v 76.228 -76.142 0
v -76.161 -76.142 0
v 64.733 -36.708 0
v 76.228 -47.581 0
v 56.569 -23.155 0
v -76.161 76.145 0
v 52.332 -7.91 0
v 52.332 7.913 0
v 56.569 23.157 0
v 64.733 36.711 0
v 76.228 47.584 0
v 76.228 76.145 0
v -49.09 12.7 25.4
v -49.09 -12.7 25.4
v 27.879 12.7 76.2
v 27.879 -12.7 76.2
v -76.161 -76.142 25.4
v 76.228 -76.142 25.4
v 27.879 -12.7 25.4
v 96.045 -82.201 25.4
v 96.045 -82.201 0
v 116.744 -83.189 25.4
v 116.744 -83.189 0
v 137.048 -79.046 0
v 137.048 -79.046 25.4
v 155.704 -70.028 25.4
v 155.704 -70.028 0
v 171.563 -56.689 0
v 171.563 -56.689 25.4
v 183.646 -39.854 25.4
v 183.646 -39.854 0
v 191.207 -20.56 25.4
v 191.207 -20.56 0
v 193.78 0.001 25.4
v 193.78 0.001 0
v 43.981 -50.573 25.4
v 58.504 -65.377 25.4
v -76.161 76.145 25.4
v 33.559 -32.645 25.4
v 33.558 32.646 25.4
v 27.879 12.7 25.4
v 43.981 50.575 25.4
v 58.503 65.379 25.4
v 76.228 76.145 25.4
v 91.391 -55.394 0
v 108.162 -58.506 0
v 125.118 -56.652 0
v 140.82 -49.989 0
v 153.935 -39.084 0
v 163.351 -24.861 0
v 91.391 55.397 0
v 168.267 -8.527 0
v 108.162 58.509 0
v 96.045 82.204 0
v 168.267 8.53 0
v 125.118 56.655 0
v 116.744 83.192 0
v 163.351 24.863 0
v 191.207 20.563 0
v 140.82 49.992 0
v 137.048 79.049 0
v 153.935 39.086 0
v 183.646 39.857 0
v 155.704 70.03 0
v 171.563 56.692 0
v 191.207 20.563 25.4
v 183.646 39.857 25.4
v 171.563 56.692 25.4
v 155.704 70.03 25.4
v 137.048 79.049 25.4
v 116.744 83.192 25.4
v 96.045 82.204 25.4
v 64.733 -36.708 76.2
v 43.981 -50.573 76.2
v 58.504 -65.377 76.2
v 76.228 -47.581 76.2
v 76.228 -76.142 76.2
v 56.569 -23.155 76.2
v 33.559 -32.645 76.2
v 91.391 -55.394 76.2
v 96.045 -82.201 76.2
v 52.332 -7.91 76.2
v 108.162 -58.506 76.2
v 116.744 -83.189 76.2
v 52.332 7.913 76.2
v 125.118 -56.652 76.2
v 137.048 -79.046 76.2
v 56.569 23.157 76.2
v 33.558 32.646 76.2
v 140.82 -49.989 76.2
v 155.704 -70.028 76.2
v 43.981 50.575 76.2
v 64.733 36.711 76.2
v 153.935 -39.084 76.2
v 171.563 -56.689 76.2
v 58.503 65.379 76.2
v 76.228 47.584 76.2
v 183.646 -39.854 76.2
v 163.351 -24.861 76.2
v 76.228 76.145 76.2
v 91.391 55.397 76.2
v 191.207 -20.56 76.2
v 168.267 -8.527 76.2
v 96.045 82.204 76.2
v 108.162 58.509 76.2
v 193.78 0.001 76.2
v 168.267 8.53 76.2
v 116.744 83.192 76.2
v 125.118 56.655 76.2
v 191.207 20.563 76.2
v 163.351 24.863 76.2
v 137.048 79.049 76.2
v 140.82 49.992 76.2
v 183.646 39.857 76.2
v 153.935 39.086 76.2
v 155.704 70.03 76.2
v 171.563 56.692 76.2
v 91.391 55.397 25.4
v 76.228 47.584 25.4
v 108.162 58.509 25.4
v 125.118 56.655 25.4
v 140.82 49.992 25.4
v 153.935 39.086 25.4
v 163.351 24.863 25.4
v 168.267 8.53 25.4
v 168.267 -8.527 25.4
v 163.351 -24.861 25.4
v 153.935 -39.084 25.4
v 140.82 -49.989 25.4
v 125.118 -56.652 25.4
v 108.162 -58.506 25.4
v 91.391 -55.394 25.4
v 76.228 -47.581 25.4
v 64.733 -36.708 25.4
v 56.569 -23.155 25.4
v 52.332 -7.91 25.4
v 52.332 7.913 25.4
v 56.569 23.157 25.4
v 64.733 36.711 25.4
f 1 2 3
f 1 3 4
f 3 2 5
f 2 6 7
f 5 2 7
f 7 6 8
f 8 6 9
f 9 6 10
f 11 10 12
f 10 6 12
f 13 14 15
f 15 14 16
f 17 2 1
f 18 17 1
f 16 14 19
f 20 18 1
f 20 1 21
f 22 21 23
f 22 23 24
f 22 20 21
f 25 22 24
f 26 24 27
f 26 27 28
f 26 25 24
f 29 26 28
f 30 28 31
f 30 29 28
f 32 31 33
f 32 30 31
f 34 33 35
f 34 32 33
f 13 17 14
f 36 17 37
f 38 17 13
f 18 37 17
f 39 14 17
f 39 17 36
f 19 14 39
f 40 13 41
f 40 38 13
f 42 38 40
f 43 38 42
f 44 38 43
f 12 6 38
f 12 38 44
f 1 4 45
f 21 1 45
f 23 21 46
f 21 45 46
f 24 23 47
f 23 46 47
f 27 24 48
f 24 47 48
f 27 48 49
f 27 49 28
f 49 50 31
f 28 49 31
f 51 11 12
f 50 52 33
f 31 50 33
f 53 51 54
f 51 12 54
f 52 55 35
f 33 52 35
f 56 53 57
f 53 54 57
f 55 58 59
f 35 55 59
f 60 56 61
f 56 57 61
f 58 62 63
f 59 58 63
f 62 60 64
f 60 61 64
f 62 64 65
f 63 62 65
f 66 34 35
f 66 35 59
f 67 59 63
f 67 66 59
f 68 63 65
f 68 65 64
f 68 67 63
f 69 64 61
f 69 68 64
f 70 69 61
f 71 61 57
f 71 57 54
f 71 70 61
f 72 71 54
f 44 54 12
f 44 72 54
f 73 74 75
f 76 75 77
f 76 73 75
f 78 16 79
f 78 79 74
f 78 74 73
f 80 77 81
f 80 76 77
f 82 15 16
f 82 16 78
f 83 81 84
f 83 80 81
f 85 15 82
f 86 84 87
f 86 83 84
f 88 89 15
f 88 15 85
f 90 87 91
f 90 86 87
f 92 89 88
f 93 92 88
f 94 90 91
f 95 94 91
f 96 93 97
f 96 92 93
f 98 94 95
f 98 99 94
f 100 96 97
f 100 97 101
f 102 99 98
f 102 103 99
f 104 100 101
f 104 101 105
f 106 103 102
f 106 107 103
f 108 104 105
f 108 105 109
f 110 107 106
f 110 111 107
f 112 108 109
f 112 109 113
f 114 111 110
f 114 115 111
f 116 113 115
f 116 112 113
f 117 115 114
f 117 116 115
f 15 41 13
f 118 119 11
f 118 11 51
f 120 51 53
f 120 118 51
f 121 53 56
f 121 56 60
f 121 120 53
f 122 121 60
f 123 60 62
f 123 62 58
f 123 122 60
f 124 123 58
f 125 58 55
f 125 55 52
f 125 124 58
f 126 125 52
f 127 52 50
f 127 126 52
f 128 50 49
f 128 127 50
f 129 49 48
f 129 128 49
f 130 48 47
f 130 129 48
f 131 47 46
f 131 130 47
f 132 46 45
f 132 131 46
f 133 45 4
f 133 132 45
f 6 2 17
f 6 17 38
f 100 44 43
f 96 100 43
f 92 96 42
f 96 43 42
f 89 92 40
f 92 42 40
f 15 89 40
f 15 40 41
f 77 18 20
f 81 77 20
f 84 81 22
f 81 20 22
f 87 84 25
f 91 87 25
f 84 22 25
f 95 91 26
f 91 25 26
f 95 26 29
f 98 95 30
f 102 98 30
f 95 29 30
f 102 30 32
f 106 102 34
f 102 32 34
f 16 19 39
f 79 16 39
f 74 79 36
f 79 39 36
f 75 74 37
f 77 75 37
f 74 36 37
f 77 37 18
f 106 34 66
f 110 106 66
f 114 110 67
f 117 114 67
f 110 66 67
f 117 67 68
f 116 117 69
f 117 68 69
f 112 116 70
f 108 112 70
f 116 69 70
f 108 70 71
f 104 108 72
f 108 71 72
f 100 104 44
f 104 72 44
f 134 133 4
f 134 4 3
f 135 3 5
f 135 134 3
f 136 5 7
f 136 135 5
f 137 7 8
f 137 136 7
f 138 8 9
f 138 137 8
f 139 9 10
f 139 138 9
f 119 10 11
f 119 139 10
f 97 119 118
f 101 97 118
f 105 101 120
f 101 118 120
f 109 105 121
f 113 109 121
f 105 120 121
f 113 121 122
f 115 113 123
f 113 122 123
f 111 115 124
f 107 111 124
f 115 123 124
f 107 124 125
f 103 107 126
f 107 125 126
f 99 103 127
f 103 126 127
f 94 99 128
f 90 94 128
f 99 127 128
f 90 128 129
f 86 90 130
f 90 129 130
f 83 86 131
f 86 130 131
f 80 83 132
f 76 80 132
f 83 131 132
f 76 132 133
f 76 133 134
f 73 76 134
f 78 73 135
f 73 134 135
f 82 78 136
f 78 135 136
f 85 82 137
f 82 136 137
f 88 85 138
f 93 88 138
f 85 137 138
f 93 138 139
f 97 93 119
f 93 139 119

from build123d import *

# Parameters (mm, degrees)
F0_W     = 152.3896604776
F0_H     = 152.2873565555
F1_DEPTH = 25.4
F3_DEPTH = 50.8
F5_DEPTH = 25.4
F7_DEPTH = 50.8
F8_DEPTH = 25.4
F9_DEPTH = 68.072


with BuildPart() as f1:
    # F0 (on Top) → F1 (new body)
    with BuildSketch(Plane.XY):
        with Locations((0.0336691737, 0.0013746321)):
            Rectangle(F0_W, F0_H)
    extrude(amount=F1_DEPTH)

    # F2 (on face) → F3 (join)
    with BuildSketch(Plane.XY.offset(25.4)):
        Polygon((-49.0896850824, 12.7), (-49.0896850824, 0), (-49.0896850824, -12.7), (27.879094705, -12.7), (27.879094705, 12.7), align=None)
    extrude(amount=F3_DEPTH)

    # F4 (on face) → F5 (cut)
    with BuildSketch(Plane.XZ.offset(12.7)):
        Polygon((-49.0896850824, 25.4), (27.879094705, 76.2), (-49.0896850824, 76.2), align=None)
    extrude(amount=-F5_DEPTH, mode=Mode.SUBTRACT)

    # F6 (on face) → F7 (join)
    with BuildSketch(Plane.XY.offset(25.4)):
        with BuildLine():
            Line((27.879094705, 12.7), (27.879094705, -12.7))
            ThreePointArc((27.879094705, -12.7), (43.9814429182, -50.5730961069), (76.2284994125, -76.1423036456))
            Line((76.2284994125, -76.1423036456), (76.2284994125, -47.5807675257))
            ThreePointArc((76.2284994125, -47.5807675257), (51.7952412993, 0.0013746321), (76.2284994125, 47.5835167899))
            Line((76.2284994125, 47.5835167899), (76.2284994125, 76.1450529099))
            ThreePointArc((76.2284994125, 76.1450529099), (43.9805998825, 50.5747391516), (27.8786713028, 12.7))
            Line((27.8786713028, 12.7), (27.879094705, 12.7))
        make_face()
        with BuildLine():
            Line((76.2284994125, -47.5807675257), (76.2284994125, -76.1423036456))
            ThreePointArc((76.2284994125, -76.1423036456), (155.7044526061, -70.0276226689), (193.7801140773, 0.0013746321))
            ThreePointArc((193.7801140773, 0.0013746321), (155.7044526061, 70.0303719332), (76.2284994125, 76.1450529099))
            Line((76.2284994125, 76.1450529099), (76.2284994125, 47.5835167899))
            ThreePointArc((76.2284994125, 47.5835167899), (137.0877616024, 52.084244528), (168.8915508086, 0.0013746321))
            ThreePointArc((168.8915508086, 0.0013746321), (137.0877616024, -52.0814952637), (76.2284994125, -47.5807675257))
        make_face()
    extrude(amount=F7_DEPTH)

    # F8 (add): a face of the model
    f8_faces = [f1.faces().sort_by_distance(p)[0] for p in [
        (191.7389103695, 0.0013746321, 25.4),
    ]]
    extrude(f8_faces, amount=F8_DEPTH)

    # F9 (cut): a face of the model
    f9_faces = [f1.faces().sort_by_distance(p)[0] for p in [
        (66.2561526249, 0.0013746321, 25.4),
    ]]
    extrude(f9_faces, amount=-F9_DEPTH, mode=Mode.SUBTRACT)


solid = f1.part
